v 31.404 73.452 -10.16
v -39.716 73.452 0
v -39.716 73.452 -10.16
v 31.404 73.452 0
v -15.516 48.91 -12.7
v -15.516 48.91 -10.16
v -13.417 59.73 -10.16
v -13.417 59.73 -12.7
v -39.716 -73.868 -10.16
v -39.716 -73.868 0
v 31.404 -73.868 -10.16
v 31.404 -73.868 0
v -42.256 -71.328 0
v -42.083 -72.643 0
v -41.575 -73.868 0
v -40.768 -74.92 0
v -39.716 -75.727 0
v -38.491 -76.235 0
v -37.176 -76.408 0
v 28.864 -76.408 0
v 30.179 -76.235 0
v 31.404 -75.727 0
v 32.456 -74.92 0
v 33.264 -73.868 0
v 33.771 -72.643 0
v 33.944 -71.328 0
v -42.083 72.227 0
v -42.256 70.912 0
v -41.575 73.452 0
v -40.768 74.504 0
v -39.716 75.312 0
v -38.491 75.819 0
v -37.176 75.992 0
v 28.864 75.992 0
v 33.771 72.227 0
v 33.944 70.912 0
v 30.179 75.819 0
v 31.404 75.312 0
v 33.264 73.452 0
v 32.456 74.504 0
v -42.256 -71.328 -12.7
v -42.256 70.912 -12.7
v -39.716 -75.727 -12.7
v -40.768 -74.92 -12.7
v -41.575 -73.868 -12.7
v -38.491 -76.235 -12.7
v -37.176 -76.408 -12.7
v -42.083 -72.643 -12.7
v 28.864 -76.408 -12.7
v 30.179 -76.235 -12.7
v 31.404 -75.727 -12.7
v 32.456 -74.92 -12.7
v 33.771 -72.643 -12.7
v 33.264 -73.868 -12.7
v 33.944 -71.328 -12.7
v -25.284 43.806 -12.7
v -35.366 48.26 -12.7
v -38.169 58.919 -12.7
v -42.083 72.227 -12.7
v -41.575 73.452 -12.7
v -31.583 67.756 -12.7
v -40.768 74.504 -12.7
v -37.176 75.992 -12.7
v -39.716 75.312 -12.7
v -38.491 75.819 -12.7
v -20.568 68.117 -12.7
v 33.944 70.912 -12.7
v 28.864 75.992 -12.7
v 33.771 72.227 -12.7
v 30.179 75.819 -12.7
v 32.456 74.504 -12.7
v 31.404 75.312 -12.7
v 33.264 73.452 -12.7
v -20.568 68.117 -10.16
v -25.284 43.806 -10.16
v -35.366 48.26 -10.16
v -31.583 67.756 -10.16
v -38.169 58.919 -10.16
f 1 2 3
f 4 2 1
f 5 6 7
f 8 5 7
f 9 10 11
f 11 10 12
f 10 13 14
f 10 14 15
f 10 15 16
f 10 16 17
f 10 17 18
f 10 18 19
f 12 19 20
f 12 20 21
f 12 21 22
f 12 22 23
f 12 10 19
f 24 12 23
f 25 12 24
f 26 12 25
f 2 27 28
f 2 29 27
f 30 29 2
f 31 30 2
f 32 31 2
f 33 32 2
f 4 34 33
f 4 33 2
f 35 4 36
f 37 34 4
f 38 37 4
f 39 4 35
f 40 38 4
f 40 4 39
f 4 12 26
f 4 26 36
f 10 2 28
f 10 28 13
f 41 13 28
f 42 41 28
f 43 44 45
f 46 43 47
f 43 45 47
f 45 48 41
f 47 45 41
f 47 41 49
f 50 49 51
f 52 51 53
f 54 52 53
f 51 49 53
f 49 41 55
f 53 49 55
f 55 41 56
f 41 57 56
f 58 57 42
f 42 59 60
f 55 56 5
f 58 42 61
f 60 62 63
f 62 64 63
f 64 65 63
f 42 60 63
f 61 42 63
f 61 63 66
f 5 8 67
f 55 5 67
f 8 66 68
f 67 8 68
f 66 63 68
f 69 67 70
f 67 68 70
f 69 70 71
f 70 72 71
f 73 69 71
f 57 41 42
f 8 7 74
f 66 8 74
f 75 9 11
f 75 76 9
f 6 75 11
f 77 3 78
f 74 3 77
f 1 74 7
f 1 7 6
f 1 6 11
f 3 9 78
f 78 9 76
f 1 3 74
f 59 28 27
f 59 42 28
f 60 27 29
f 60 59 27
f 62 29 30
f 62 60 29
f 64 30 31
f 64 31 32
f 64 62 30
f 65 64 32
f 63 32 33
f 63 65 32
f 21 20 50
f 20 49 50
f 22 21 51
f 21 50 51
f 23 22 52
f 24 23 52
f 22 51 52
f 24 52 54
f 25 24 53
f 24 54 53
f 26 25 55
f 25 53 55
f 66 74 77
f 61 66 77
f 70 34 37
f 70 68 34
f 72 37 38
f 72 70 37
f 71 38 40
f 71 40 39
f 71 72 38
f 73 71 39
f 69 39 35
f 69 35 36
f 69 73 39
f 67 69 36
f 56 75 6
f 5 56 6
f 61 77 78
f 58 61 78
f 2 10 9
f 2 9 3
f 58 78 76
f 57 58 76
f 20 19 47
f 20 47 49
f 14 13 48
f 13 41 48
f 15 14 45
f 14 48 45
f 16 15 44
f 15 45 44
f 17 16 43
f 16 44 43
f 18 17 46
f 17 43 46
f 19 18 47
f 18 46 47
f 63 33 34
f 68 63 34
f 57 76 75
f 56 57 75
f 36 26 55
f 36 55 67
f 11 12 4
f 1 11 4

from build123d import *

# Parameters (mm, degrees)
F0_W     = 76.2
F0_H     = 152.4
F1_DEPTH = 12.7
F2_T     = -2.54
F4_DEPTH = 58.25523
F5_R     = 5.08


with BuildPart() as f1:
    # F0 (on Top) → F1 (new body)
    with BuildSketch(Plane.XY):
        with Locations((-4.155798, -0.207823)):
            Rectangle(F0_W, F0_H)
    extrude(amount=-F1_DEPTH)

    # F2
    f2_openings = [f1.faces().sort_by_distance(p)[0] for p in [
        (-4.155798, -0.207823, 0),
    ]]
    offset(amount=F2_T, openings=f2_openings)

    # F3 (on face) → F4 (cut)
    with BuildSketch(Plane.XY.offset(-10.16)):
        Polygon((-35.365767, 48.259617), (-25.284341, 43.805525), (-15.516325, 48.91042), (-13.417234, 59.730213), (-20.567727, 68.117378), (-31.583337, 67.75621), (-38.169084, 58.918675), align=None)
    extrude(amount=-F4_DEPTH, mode=Mode.SUBTRACT)

    # F5
    f5_edges = [f1.edges().sort_by_distance(p)[0] for p in [
        (33.944202, -76.407823, -6.35),
        (-42.255798, -76.407823, -6.35),
        (33.944202, 75.992177, -6.35),
        (-42.255798, 75.992177, -6.35),
    ]]
    fillet(f5_edges, radius=F5_R)


solid = f1.part
